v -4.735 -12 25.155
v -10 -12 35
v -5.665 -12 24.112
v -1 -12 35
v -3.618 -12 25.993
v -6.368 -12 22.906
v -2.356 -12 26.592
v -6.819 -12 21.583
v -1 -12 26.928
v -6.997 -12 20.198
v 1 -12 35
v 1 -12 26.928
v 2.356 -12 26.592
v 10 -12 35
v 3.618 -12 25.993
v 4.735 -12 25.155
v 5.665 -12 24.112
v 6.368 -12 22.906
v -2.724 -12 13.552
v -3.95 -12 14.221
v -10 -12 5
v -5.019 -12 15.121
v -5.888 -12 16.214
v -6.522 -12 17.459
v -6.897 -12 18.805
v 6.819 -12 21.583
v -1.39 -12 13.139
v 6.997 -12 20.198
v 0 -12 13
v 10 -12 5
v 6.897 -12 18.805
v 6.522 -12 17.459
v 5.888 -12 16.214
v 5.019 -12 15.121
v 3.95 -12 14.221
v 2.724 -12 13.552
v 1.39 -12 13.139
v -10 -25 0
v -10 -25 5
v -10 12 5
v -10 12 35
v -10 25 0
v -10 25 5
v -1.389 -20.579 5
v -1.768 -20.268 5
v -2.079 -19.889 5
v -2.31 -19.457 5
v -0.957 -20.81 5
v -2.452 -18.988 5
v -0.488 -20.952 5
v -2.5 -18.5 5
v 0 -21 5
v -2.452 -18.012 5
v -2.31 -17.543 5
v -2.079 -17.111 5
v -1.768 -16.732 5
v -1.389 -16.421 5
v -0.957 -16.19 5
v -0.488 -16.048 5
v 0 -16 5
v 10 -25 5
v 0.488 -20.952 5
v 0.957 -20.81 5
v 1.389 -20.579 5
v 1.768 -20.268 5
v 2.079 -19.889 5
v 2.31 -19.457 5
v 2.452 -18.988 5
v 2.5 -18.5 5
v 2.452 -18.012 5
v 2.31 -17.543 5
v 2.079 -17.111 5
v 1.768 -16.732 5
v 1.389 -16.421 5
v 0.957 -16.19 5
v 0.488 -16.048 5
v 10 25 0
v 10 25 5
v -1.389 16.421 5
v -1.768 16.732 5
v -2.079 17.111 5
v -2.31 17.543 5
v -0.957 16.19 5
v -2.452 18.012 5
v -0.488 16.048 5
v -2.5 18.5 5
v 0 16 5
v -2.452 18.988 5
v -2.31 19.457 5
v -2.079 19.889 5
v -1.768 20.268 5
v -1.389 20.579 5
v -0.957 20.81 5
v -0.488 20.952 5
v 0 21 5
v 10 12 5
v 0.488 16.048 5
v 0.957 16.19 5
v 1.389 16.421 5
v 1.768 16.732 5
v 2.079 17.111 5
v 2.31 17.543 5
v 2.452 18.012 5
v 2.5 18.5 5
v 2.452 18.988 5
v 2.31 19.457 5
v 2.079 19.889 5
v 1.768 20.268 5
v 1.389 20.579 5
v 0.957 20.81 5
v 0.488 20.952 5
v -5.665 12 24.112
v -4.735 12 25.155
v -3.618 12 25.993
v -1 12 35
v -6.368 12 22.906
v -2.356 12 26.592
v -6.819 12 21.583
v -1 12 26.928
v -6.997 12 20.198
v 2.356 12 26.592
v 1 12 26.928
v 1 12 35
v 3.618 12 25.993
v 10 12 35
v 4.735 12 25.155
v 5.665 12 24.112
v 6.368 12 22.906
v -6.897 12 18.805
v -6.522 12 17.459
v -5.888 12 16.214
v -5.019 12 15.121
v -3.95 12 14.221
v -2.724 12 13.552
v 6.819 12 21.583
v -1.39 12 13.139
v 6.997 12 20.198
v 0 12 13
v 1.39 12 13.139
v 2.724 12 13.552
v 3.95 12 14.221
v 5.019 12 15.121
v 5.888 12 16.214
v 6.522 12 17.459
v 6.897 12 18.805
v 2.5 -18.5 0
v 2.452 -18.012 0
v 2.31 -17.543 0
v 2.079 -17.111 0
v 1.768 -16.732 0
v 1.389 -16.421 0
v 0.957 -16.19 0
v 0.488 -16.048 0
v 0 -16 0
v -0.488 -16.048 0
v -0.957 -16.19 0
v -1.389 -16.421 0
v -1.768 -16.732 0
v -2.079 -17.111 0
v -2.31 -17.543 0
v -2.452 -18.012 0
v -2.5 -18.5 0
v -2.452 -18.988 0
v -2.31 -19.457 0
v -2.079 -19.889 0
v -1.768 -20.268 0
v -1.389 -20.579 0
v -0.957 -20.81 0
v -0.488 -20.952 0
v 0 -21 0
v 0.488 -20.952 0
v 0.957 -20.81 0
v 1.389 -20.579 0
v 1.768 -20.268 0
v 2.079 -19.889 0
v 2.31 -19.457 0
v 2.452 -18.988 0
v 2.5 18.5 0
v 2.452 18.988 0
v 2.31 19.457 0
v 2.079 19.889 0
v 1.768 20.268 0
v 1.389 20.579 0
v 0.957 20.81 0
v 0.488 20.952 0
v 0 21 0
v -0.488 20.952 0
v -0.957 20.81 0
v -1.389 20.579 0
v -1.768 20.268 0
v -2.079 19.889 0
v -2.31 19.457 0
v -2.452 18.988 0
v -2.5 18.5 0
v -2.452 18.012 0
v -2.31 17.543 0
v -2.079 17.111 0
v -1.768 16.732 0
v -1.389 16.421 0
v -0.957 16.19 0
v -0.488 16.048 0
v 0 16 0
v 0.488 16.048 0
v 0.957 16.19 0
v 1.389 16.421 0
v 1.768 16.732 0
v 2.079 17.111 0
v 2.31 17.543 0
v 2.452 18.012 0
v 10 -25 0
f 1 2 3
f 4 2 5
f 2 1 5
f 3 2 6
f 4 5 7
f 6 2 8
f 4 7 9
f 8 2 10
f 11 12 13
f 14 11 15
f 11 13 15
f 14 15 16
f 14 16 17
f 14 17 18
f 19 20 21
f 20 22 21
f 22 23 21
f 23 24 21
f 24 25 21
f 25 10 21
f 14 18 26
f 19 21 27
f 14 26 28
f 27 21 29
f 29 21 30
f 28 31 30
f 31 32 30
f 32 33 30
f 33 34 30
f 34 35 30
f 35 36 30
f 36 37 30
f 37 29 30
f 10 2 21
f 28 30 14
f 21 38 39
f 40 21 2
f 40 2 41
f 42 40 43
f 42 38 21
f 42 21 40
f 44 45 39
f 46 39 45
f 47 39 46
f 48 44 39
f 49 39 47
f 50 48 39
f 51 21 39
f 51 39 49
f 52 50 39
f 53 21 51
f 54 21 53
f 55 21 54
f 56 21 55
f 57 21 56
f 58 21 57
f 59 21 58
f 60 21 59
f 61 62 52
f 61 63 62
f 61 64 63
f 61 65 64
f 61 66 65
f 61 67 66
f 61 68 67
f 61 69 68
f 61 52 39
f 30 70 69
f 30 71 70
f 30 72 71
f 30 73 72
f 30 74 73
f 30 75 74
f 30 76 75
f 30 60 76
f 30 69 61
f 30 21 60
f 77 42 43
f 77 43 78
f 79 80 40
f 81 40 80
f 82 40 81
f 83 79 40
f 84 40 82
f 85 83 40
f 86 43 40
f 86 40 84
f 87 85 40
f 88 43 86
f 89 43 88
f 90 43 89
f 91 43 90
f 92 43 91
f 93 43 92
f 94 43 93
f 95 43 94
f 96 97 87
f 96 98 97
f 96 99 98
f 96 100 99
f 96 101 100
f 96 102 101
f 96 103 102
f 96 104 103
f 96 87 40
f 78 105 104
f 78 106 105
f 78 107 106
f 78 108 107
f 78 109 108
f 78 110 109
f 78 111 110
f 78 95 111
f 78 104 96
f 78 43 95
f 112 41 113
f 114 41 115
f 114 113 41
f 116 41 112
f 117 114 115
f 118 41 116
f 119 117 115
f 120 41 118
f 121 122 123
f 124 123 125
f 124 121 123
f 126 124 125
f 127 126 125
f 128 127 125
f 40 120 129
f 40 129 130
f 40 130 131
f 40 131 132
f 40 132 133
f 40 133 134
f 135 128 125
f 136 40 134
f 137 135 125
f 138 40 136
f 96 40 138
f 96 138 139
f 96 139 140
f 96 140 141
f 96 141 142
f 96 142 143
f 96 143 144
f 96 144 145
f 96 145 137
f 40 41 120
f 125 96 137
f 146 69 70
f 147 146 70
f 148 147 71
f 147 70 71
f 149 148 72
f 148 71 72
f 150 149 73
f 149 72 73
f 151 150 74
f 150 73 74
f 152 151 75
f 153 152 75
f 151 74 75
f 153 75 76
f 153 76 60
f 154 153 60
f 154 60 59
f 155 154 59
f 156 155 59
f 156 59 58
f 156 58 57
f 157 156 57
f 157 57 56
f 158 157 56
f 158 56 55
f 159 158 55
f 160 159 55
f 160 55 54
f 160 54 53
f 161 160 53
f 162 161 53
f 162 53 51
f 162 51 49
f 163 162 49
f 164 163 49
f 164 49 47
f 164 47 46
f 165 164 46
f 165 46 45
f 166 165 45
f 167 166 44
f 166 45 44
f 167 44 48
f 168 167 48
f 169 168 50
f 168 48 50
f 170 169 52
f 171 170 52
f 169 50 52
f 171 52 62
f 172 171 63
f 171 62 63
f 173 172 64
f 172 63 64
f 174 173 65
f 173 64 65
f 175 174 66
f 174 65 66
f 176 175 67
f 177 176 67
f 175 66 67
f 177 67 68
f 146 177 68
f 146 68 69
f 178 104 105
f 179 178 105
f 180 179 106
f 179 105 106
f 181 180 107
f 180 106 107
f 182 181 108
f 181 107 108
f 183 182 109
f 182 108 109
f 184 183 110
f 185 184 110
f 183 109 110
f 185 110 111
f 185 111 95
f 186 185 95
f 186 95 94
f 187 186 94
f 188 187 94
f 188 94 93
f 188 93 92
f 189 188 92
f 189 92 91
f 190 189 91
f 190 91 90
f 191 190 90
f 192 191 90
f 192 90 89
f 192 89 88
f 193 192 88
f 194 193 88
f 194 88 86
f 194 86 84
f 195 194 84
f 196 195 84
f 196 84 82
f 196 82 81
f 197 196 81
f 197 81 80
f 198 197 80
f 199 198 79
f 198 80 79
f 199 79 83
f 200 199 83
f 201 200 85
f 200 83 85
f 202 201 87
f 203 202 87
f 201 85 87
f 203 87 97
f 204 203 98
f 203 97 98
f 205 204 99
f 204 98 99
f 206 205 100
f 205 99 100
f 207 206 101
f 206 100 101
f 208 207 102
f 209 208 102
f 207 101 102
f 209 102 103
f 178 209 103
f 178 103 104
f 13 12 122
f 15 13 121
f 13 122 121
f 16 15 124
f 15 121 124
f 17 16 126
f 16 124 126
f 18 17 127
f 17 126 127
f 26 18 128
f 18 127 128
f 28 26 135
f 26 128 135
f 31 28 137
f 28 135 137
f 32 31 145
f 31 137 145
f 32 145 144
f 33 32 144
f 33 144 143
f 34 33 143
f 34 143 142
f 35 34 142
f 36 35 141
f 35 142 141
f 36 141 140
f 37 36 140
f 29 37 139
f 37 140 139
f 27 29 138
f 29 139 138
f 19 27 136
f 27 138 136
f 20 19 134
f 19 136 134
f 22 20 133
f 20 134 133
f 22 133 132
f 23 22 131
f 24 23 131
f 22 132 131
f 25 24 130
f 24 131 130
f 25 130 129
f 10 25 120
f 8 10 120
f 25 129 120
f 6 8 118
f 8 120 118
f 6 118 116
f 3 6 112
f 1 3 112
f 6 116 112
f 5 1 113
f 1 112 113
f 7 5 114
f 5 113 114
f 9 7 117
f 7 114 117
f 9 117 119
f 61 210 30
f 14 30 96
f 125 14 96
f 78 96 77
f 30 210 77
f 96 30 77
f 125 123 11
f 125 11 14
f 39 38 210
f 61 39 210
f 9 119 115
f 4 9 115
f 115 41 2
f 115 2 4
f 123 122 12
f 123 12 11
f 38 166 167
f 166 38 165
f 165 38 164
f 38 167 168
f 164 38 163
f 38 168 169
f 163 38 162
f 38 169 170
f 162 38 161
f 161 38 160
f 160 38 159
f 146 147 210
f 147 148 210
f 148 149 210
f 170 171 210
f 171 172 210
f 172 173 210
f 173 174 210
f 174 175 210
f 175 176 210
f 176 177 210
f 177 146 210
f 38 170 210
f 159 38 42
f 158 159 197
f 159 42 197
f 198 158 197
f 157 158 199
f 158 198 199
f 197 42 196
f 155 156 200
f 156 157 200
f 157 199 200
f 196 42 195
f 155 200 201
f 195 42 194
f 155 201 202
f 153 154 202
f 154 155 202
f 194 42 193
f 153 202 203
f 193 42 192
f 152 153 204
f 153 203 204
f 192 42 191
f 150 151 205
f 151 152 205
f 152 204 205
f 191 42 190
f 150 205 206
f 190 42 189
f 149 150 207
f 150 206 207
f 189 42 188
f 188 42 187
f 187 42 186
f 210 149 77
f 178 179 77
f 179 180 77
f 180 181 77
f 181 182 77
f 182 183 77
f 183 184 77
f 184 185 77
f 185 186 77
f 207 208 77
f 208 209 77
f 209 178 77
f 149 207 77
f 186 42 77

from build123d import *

# Parameters (mm, degrees)
SKETCH020_W     = 20
SKETCH020_H     = 50
PAD011_DEPTH    = 5
SKETCH021_R     = 2.5
POCKET008_DEPTH = 5.001
SKETCH022_W     = 20
SKETCH022_H     = 24
PAD012_DEPTH    = 30
SKETCH023_R     = 7
POCKET009_DEPTH = 37.001
SKETCH024_W     = 2
SKETCH024_H     = 8.31
POCKET010_DEPTH = 37.001


with BuildPart() as part:
    # Sketch020 → Pad011 (new body)
    with BuildSketch(Plane.XY):
        Rectangle(SKETCH020_W, SKETCH020_H)
    extrude(amount=PAD011_DEPTH)

    # Sketch021 (on Face6 of Pad011) → Pocket008 (cut, through all)
    with BuildSketch(Plane.XY.offset(5)):
        with Locations((0, -18.5)):
            Circle(SKETCH021_R)
        with Locations((0, 18.5)):
            Circle(SKETCH021_R)
    extrude(amount=-POCKET008_DEPTH, mode=Mode.SUBTRACT)

    # Sketch022 (on Face5 of Pocket008) → Pad012 (join)
    with BuildSketch(Plane.XY.offset(5)):
        Rectangle(SKETCH022_W, SKETCH022_H)
    extrude(amount=PAD012_DEPTH)

    # Sketch023 (on Face12 of Pad012) → Pocket009 (cut, through all)
    with BuildSketch(Plane(origin=(0, 12, 0), x_dir=(-1, 0, 0), z_dir=(0, 1, 0))):
        with Locations((0, 20)):
            Circle(SKETCH023_R)
    extrude(amount=-POCKET009_DEPTH, mode=Mode.SUBTRACT)

    # Sketch024 (on Face12 of Pocket009) → Pocket010 (cut, through all)
    with BuildSketch(Plane(origin=(0, 12, 0), x_dir=(-1, 0, 0), z_dir=(0, 1, 0))):
        with Locations((0, 30.845)):
            Rectangle(SKETCH024_W, SKETCH024_H)
    extrude(amount=-POCKET010_DEPTH, mode=Mode.SUBTRACT)


solid = part.part
